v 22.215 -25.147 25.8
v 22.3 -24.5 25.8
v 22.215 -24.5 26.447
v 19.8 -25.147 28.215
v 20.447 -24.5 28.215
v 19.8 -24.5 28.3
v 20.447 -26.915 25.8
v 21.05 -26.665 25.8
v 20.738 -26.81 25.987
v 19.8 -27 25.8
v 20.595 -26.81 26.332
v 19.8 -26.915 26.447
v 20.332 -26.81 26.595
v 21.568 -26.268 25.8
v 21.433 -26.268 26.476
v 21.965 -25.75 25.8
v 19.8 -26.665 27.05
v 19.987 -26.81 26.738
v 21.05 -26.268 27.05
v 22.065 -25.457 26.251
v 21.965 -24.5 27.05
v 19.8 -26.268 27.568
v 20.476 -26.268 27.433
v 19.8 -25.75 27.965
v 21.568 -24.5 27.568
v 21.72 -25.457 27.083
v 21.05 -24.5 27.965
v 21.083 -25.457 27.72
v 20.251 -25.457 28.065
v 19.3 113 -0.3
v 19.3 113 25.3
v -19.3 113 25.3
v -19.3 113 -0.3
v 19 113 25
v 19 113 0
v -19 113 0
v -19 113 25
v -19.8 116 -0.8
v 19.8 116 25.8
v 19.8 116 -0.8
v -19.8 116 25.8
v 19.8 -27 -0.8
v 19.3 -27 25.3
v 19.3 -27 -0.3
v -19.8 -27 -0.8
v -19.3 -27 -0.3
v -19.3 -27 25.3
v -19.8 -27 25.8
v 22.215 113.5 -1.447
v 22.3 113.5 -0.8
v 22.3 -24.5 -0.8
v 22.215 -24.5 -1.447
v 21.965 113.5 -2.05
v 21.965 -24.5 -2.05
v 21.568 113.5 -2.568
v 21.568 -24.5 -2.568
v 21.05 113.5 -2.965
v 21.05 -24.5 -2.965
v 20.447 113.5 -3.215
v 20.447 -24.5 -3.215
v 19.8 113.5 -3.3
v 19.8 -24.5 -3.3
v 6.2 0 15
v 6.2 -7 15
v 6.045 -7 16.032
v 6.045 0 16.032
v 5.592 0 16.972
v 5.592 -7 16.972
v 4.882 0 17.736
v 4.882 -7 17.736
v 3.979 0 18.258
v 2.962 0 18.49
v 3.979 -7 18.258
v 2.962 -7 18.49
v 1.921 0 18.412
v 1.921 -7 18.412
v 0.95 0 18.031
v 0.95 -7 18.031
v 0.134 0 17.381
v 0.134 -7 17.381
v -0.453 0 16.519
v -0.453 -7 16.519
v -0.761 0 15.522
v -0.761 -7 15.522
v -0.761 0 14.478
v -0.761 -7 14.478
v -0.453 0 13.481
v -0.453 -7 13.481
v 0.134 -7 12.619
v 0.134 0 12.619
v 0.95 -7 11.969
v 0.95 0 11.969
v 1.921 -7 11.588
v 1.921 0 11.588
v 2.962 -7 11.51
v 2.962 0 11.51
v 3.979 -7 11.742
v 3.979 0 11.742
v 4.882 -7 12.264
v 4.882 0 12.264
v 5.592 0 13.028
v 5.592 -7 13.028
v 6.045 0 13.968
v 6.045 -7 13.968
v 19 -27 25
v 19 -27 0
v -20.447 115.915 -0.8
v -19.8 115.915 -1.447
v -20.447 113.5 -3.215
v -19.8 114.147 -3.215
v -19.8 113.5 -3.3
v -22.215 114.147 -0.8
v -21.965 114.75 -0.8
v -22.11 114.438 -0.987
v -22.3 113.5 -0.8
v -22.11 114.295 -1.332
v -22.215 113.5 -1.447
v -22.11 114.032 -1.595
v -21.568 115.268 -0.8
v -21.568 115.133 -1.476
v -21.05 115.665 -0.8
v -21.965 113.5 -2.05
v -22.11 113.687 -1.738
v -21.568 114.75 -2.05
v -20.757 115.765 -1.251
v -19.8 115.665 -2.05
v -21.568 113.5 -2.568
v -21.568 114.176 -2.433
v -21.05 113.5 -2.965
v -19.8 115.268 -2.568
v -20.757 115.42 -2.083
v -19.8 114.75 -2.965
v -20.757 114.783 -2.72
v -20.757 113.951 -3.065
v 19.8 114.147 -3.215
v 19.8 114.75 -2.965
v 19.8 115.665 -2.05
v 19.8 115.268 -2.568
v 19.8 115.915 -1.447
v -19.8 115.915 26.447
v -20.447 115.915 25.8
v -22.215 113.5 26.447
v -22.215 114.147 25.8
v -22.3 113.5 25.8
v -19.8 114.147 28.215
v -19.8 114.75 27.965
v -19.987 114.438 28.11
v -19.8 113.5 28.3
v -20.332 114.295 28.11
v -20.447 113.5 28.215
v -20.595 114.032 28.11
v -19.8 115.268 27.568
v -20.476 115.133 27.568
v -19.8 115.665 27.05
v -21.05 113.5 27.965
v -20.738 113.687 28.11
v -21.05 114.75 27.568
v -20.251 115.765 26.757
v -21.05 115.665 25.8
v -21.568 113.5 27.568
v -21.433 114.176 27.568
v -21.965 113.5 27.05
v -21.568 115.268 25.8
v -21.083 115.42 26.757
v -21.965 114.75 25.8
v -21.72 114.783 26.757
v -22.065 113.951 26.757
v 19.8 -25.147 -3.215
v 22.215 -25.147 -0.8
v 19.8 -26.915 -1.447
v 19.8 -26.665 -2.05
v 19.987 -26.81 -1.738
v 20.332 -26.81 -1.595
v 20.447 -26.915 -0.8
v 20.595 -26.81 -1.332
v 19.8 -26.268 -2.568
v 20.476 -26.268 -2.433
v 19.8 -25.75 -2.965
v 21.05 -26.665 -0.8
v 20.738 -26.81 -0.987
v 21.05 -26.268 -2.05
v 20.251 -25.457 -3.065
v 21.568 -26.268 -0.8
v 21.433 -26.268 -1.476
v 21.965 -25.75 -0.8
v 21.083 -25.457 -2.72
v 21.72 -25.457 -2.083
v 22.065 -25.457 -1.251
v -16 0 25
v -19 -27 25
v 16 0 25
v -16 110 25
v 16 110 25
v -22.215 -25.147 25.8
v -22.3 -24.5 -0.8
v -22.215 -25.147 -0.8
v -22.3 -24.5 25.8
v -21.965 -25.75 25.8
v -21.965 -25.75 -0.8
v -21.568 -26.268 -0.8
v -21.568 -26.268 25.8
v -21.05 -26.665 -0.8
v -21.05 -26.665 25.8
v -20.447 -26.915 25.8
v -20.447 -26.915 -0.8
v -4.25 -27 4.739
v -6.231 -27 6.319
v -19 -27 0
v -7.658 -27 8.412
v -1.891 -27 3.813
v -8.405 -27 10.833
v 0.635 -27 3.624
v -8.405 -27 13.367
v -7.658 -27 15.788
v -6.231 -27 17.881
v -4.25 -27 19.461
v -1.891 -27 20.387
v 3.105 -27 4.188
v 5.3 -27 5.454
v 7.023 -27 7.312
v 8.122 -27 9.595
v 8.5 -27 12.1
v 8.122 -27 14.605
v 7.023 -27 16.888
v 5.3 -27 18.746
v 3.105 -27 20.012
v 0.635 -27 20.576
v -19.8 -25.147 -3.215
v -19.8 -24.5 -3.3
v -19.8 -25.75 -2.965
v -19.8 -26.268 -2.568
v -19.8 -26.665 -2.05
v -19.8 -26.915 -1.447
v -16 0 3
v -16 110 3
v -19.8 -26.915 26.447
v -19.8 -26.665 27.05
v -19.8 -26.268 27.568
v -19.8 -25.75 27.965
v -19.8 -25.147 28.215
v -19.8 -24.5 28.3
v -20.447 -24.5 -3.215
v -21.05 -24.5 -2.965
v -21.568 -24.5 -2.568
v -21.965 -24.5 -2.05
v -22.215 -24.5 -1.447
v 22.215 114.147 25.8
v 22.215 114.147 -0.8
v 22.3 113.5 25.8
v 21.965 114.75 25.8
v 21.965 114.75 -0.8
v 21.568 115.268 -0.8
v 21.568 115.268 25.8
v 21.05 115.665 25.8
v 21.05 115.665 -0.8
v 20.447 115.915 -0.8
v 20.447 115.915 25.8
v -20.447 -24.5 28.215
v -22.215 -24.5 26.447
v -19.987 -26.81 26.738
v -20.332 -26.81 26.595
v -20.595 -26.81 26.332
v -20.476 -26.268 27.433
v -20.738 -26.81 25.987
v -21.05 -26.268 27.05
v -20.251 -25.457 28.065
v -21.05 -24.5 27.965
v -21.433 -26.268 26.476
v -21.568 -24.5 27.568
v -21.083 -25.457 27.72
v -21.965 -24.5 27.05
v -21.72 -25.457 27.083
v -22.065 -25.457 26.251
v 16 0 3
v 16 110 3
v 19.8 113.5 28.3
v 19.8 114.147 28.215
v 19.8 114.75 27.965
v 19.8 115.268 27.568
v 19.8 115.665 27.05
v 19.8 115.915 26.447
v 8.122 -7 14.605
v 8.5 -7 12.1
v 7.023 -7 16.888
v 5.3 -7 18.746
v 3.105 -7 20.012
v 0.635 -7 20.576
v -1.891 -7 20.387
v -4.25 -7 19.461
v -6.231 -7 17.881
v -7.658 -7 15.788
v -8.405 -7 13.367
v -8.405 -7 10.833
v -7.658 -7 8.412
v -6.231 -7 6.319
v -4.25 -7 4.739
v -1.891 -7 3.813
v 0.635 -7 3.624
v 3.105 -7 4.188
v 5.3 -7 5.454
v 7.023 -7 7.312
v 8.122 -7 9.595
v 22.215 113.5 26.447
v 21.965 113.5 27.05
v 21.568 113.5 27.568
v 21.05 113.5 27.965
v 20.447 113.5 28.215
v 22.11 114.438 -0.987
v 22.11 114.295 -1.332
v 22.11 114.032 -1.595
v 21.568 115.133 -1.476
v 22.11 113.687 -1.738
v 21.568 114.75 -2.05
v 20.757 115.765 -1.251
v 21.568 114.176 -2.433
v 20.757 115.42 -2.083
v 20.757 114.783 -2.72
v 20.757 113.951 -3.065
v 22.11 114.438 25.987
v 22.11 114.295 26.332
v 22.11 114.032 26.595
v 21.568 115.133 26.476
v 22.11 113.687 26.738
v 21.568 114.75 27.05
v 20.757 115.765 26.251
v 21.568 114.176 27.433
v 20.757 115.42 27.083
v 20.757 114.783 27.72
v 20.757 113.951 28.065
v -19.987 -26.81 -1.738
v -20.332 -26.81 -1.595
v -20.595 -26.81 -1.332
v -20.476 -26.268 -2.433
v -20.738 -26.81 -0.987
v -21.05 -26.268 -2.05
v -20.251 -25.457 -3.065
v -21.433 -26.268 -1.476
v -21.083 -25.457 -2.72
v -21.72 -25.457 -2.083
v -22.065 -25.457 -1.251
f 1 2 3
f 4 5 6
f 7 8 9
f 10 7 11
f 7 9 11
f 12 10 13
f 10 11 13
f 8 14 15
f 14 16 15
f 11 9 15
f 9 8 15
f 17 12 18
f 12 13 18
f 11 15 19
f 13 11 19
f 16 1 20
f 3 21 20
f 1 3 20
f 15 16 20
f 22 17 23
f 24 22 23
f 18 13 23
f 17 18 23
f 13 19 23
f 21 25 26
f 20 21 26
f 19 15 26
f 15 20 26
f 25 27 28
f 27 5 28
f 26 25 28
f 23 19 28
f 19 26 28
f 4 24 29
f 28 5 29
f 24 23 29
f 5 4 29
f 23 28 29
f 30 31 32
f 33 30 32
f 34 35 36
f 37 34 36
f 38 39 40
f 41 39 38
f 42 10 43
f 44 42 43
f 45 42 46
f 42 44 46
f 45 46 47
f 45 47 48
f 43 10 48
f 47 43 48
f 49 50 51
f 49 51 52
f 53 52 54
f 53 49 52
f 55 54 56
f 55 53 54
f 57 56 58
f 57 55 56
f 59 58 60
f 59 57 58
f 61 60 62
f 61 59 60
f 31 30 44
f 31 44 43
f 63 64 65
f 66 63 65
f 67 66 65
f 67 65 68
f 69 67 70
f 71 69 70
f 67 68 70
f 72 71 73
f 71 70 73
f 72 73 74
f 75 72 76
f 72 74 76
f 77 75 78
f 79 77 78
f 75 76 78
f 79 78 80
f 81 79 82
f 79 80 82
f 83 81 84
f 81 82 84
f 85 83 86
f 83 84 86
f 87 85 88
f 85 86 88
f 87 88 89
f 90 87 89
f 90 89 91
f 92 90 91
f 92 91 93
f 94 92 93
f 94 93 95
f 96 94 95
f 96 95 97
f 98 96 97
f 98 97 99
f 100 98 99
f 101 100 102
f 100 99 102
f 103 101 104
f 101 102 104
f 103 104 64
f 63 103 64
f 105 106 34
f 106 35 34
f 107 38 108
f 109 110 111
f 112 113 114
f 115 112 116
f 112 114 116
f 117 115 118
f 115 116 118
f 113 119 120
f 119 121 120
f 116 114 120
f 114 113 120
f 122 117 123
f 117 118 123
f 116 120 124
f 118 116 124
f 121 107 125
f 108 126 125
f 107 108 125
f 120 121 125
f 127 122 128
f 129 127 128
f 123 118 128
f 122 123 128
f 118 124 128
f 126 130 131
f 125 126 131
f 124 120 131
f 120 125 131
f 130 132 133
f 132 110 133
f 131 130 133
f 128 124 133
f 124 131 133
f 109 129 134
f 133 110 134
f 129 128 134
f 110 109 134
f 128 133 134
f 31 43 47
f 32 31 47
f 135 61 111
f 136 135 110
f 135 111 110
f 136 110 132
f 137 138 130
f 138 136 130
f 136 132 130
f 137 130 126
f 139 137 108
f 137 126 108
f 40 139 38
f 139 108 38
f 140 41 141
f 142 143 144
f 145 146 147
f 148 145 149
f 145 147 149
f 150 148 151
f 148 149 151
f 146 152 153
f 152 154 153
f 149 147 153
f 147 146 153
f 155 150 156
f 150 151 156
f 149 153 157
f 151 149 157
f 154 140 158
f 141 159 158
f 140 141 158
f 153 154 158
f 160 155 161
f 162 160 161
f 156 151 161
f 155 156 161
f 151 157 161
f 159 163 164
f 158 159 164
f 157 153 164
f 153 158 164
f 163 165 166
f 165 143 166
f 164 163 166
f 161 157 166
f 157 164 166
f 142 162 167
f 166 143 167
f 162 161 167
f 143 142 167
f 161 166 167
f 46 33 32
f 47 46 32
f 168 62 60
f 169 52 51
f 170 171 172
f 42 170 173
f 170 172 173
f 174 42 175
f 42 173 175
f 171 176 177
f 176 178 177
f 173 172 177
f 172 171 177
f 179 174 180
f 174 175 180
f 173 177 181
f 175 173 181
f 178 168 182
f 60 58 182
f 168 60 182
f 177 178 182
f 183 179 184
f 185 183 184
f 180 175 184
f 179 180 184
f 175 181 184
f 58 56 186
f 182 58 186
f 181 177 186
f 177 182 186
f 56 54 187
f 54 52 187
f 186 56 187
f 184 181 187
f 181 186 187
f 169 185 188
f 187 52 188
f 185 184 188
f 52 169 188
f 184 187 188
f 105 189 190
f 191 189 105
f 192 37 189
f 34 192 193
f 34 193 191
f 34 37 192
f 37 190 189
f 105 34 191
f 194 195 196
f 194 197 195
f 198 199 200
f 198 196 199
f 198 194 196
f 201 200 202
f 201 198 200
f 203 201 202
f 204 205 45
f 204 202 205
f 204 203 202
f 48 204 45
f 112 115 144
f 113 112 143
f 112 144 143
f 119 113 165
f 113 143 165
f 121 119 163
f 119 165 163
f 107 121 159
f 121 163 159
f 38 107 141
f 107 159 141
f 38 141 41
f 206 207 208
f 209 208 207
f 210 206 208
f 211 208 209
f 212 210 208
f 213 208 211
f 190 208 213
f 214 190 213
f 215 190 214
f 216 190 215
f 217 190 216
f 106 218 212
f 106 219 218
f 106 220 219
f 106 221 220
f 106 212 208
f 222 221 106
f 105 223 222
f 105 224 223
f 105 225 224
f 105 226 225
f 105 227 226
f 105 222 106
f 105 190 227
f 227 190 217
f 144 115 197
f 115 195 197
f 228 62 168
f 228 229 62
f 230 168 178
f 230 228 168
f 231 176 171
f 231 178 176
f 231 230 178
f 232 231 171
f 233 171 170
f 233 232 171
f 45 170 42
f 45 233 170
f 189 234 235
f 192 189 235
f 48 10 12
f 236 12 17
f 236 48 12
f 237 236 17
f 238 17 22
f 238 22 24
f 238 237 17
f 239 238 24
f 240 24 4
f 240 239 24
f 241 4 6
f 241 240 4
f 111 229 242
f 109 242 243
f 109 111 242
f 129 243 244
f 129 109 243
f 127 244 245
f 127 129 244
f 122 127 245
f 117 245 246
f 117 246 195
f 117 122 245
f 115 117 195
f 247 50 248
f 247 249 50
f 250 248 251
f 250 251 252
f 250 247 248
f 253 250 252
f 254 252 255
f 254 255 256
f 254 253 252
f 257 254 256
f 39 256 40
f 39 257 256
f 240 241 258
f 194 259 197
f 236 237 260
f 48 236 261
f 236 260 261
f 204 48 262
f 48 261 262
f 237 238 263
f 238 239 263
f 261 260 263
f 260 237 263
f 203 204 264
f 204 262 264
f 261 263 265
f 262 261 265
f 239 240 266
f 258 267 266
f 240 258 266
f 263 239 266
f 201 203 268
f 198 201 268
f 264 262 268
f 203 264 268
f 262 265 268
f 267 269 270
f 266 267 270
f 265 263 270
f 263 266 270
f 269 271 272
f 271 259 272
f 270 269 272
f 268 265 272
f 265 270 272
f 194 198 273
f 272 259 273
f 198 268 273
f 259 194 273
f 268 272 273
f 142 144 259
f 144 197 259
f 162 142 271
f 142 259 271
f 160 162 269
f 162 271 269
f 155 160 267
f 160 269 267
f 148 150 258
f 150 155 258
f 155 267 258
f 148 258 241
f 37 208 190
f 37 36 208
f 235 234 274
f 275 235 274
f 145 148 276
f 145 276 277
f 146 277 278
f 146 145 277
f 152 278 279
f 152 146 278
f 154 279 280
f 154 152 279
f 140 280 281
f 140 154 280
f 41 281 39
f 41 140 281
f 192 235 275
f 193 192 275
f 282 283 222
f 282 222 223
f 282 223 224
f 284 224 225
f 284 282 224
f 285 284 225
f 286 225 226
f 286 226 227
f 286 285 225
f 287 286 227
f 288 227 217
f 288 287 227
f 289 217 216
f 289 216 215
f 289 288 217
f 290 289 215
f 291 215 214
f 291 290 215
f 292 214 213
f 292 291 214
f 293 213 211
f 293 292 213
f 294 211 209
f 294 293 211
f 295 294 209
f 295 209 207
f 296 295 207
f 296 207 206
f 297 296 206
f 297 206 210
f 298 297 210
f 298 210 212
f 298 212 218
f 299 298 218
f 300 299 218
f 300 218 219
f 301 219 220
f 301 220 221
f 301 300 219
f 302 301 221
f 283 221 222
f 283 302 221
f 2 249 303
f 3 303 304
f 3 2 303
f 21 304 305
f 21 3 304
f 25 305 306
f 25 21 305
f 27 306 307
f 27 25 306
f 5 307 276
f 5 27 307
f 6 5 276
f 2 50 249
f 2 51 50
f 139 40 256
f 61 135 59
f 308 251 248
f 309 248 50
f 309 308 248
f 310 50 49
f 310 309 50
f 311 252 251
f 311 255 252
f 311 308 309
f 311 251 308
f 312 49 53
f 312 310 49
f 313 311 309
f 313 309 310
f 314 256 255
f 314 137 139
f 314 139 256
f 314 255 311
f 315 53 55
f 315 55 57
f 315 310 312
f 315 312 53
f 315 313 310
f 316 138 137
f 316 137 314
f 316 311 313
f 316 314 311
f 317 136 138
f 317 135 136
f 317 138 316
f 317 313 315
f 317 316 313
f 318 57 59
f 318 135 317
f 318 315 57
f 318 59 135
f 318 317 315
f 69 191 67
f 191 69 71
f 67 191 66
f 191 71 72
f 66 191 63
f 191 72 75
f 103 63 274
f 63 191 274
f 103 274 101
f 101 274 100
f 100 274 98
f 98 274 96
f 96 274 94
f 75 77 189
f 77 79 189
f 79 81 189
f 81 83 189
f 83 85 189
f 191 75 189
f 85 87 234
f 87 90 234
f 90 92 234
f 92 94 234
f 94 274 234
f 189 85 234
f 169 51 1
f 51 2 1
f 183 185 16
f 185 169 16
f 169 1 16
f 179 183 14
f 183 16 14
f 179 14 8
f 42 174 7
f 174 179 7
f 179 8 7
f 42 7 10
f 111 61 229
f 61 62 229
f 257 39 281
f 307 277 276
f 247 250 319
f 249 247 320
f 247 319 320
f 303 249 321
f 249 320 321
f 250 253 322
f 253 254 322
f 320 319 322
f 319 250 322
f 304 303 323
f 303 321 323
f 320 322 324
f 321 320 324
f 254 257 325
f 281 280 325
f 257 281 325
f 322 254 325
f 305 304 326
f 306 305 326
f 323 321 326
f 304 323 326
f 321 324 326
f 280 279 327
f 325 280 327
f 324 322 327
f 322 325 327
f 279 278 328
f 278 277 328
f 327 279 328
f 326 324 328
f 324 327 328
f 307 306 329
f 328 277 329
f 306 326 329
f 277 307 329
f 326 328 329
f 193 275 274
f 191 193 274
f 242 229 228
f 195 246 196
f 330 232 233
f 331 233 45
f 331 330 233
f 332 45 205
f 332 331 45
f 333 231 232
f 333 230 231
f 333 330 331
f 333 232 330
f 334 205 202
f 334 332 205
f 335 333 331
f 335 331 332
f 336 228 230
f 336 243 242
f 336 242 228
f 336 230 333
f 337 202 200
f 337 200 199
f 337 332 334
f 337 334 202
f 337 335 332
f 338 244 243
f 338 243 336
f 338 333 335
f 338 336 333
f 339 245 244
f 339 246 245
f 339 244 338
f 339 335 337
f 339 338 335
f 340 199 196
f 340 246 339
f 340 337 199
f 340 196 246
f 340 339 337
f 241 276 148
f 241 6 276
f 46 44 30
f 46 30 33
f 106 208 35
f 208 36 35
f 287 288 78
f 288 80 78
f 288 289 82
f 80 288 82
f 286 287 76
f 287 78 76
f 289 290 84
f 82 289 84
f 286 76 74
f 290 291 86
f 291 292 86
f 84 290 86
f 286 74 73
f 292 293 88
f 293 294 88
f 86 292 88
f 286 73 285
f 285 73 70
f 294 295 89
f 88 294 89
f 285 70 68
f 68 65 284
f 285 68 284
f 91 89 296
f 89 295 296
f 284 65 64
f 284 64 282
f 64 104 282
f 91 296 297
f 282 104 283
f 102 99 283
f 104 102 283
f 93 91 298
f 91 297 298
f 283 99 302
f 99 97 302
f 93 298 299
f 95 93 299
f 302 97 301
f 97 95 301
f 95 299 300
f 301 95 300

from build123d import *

# Parameters (mm, degrees)
F1_DEPTH = 3
F2_DEPTH = 25
F3_W     = 44.5999994099
F3_H     = 31.5999994099
F3_W_2   = 38.6
F3_H_2   = 25.6
F4_DEPTH = 140
F3_W_3   = 38
F3_H_3   = 25
F5_DEPTH = 3
F6_W     = 38
F6_H     = 25
F6_R     = 8.5
F7_DEPTH = 20
F6_R_2   = 3.5
F8_DEPTH = 7
F9_R     = 2.5


with BuildPart() as f1:
    # F0 (on Top) → F1 (new body)
    with BuildSketch(Plane.XY):
        Polygon((16, 110), (0, 110), (-16, 110), (-16, 50), (-16, 0), (0, 0), (16, 0), (16, 50), align=None)
    extrude(amount=F1_DEPTH)

    # F0 (on Top) → F2 (join)
    with BuildSketch(Plane.XY):
        Polygon((19, 113), (0, 113), (-19, 113), (-19, 47), (-19, -3), (-19, -7), (0, -7), (19, -7), (19, -3), (19, 47), align=None)
        Polygon((-16, 110), (0, 110), (16, 110), (16, 50), (16, 0), (0, 0), (-16, 0), (-16, 50), align=None, mode=Mode.SUBTRACT)
    extrude(amount=F2_DEPTH)

    # F6 (on face) → F7 (join)
    with BuildSketch(Plane.XZ.offset(7)):
        with Locations((0, 12.5)):
            Rectangle(F6_W, F6_H)
        with Locations((0, 12.1)):
            Circle(F6_R, mode=Mode.SUBTRACT)
    extrude(amount=F7_DEPTH)

    # F6 (on face) → F8 (cut, through all)
    with BuildSketch(Plane.XZ.offset(7)):
        with Locations((2.7, 15)):
            Circle(F6_R_2)
    extrude(amount=-F8_DEPTH, mode=Mode.SUBTRACT)


with BuildPart() as f4:
    # F3 (on face) → F4 (new body)
    with BuildSketch(Plane(origin=(0, 113, 0), x_dir=(-1, 0, 0), z_dir=(0, 1, 0))):
        with Locations((0, 12.5)):
            Rectangle(F3_W, F3_H)
        with Locations((0, 12.5)):
            Rectangle(F3_W_2, F3_H_2, mode=Mode.SUBTRACT)
    extrude(amount=-F4_DEPTH)

    # F3 (on face) → F5 (join)
    with BuildSketch(Plane(origin=(0, 113, 0), x_dir=(-1, 0, 0), z_dir=(0, 1, 0))):
        with Locations((0, 12.5)):
            Rectangle(F3_W, F3_H)
        with Locations((0, 12.5)):
            Rectangle(F3_W_2, F3_H_2, mode=Mode.SUBTRACT)
        with Locations((0, 12.5)):
            Rectangle(F3_W_2, F3_H_2)
        with Locations((0, 12.5)):
            Rectangle(F3_W_3, F3_H_3, mode=Mode.SUBTRACT)
        with Locations((0, 12.5)):
            Rectangle(F3_W_3, F3_H_3)
    extrude(amount=F5_DEPTH)

    # F9
    f9_edges = [f4.edges().sort_by_distance(p)[0] for p in [
        (0, 116, -3.3),
        (-22.3, 116, 12.5),
        (0, 116, 28.3),
        (22.3, 116, 12.5),
        (-22.3, 44.5, 28.3),
        (-22.3, 44.5, -3.3),
        (22.3, 44.5, -3.3),
        (22.3, 44.5, 28.3),
        (0, -27, -3.3),
        (22.3, -27, 12.5),
        (0, -27, 28.3),
        (-22.3, -27, 12.5),
    ]]
    fillet(f9_edges, radius=F9_R)


solid = Compound([f1.part, f4.part])
